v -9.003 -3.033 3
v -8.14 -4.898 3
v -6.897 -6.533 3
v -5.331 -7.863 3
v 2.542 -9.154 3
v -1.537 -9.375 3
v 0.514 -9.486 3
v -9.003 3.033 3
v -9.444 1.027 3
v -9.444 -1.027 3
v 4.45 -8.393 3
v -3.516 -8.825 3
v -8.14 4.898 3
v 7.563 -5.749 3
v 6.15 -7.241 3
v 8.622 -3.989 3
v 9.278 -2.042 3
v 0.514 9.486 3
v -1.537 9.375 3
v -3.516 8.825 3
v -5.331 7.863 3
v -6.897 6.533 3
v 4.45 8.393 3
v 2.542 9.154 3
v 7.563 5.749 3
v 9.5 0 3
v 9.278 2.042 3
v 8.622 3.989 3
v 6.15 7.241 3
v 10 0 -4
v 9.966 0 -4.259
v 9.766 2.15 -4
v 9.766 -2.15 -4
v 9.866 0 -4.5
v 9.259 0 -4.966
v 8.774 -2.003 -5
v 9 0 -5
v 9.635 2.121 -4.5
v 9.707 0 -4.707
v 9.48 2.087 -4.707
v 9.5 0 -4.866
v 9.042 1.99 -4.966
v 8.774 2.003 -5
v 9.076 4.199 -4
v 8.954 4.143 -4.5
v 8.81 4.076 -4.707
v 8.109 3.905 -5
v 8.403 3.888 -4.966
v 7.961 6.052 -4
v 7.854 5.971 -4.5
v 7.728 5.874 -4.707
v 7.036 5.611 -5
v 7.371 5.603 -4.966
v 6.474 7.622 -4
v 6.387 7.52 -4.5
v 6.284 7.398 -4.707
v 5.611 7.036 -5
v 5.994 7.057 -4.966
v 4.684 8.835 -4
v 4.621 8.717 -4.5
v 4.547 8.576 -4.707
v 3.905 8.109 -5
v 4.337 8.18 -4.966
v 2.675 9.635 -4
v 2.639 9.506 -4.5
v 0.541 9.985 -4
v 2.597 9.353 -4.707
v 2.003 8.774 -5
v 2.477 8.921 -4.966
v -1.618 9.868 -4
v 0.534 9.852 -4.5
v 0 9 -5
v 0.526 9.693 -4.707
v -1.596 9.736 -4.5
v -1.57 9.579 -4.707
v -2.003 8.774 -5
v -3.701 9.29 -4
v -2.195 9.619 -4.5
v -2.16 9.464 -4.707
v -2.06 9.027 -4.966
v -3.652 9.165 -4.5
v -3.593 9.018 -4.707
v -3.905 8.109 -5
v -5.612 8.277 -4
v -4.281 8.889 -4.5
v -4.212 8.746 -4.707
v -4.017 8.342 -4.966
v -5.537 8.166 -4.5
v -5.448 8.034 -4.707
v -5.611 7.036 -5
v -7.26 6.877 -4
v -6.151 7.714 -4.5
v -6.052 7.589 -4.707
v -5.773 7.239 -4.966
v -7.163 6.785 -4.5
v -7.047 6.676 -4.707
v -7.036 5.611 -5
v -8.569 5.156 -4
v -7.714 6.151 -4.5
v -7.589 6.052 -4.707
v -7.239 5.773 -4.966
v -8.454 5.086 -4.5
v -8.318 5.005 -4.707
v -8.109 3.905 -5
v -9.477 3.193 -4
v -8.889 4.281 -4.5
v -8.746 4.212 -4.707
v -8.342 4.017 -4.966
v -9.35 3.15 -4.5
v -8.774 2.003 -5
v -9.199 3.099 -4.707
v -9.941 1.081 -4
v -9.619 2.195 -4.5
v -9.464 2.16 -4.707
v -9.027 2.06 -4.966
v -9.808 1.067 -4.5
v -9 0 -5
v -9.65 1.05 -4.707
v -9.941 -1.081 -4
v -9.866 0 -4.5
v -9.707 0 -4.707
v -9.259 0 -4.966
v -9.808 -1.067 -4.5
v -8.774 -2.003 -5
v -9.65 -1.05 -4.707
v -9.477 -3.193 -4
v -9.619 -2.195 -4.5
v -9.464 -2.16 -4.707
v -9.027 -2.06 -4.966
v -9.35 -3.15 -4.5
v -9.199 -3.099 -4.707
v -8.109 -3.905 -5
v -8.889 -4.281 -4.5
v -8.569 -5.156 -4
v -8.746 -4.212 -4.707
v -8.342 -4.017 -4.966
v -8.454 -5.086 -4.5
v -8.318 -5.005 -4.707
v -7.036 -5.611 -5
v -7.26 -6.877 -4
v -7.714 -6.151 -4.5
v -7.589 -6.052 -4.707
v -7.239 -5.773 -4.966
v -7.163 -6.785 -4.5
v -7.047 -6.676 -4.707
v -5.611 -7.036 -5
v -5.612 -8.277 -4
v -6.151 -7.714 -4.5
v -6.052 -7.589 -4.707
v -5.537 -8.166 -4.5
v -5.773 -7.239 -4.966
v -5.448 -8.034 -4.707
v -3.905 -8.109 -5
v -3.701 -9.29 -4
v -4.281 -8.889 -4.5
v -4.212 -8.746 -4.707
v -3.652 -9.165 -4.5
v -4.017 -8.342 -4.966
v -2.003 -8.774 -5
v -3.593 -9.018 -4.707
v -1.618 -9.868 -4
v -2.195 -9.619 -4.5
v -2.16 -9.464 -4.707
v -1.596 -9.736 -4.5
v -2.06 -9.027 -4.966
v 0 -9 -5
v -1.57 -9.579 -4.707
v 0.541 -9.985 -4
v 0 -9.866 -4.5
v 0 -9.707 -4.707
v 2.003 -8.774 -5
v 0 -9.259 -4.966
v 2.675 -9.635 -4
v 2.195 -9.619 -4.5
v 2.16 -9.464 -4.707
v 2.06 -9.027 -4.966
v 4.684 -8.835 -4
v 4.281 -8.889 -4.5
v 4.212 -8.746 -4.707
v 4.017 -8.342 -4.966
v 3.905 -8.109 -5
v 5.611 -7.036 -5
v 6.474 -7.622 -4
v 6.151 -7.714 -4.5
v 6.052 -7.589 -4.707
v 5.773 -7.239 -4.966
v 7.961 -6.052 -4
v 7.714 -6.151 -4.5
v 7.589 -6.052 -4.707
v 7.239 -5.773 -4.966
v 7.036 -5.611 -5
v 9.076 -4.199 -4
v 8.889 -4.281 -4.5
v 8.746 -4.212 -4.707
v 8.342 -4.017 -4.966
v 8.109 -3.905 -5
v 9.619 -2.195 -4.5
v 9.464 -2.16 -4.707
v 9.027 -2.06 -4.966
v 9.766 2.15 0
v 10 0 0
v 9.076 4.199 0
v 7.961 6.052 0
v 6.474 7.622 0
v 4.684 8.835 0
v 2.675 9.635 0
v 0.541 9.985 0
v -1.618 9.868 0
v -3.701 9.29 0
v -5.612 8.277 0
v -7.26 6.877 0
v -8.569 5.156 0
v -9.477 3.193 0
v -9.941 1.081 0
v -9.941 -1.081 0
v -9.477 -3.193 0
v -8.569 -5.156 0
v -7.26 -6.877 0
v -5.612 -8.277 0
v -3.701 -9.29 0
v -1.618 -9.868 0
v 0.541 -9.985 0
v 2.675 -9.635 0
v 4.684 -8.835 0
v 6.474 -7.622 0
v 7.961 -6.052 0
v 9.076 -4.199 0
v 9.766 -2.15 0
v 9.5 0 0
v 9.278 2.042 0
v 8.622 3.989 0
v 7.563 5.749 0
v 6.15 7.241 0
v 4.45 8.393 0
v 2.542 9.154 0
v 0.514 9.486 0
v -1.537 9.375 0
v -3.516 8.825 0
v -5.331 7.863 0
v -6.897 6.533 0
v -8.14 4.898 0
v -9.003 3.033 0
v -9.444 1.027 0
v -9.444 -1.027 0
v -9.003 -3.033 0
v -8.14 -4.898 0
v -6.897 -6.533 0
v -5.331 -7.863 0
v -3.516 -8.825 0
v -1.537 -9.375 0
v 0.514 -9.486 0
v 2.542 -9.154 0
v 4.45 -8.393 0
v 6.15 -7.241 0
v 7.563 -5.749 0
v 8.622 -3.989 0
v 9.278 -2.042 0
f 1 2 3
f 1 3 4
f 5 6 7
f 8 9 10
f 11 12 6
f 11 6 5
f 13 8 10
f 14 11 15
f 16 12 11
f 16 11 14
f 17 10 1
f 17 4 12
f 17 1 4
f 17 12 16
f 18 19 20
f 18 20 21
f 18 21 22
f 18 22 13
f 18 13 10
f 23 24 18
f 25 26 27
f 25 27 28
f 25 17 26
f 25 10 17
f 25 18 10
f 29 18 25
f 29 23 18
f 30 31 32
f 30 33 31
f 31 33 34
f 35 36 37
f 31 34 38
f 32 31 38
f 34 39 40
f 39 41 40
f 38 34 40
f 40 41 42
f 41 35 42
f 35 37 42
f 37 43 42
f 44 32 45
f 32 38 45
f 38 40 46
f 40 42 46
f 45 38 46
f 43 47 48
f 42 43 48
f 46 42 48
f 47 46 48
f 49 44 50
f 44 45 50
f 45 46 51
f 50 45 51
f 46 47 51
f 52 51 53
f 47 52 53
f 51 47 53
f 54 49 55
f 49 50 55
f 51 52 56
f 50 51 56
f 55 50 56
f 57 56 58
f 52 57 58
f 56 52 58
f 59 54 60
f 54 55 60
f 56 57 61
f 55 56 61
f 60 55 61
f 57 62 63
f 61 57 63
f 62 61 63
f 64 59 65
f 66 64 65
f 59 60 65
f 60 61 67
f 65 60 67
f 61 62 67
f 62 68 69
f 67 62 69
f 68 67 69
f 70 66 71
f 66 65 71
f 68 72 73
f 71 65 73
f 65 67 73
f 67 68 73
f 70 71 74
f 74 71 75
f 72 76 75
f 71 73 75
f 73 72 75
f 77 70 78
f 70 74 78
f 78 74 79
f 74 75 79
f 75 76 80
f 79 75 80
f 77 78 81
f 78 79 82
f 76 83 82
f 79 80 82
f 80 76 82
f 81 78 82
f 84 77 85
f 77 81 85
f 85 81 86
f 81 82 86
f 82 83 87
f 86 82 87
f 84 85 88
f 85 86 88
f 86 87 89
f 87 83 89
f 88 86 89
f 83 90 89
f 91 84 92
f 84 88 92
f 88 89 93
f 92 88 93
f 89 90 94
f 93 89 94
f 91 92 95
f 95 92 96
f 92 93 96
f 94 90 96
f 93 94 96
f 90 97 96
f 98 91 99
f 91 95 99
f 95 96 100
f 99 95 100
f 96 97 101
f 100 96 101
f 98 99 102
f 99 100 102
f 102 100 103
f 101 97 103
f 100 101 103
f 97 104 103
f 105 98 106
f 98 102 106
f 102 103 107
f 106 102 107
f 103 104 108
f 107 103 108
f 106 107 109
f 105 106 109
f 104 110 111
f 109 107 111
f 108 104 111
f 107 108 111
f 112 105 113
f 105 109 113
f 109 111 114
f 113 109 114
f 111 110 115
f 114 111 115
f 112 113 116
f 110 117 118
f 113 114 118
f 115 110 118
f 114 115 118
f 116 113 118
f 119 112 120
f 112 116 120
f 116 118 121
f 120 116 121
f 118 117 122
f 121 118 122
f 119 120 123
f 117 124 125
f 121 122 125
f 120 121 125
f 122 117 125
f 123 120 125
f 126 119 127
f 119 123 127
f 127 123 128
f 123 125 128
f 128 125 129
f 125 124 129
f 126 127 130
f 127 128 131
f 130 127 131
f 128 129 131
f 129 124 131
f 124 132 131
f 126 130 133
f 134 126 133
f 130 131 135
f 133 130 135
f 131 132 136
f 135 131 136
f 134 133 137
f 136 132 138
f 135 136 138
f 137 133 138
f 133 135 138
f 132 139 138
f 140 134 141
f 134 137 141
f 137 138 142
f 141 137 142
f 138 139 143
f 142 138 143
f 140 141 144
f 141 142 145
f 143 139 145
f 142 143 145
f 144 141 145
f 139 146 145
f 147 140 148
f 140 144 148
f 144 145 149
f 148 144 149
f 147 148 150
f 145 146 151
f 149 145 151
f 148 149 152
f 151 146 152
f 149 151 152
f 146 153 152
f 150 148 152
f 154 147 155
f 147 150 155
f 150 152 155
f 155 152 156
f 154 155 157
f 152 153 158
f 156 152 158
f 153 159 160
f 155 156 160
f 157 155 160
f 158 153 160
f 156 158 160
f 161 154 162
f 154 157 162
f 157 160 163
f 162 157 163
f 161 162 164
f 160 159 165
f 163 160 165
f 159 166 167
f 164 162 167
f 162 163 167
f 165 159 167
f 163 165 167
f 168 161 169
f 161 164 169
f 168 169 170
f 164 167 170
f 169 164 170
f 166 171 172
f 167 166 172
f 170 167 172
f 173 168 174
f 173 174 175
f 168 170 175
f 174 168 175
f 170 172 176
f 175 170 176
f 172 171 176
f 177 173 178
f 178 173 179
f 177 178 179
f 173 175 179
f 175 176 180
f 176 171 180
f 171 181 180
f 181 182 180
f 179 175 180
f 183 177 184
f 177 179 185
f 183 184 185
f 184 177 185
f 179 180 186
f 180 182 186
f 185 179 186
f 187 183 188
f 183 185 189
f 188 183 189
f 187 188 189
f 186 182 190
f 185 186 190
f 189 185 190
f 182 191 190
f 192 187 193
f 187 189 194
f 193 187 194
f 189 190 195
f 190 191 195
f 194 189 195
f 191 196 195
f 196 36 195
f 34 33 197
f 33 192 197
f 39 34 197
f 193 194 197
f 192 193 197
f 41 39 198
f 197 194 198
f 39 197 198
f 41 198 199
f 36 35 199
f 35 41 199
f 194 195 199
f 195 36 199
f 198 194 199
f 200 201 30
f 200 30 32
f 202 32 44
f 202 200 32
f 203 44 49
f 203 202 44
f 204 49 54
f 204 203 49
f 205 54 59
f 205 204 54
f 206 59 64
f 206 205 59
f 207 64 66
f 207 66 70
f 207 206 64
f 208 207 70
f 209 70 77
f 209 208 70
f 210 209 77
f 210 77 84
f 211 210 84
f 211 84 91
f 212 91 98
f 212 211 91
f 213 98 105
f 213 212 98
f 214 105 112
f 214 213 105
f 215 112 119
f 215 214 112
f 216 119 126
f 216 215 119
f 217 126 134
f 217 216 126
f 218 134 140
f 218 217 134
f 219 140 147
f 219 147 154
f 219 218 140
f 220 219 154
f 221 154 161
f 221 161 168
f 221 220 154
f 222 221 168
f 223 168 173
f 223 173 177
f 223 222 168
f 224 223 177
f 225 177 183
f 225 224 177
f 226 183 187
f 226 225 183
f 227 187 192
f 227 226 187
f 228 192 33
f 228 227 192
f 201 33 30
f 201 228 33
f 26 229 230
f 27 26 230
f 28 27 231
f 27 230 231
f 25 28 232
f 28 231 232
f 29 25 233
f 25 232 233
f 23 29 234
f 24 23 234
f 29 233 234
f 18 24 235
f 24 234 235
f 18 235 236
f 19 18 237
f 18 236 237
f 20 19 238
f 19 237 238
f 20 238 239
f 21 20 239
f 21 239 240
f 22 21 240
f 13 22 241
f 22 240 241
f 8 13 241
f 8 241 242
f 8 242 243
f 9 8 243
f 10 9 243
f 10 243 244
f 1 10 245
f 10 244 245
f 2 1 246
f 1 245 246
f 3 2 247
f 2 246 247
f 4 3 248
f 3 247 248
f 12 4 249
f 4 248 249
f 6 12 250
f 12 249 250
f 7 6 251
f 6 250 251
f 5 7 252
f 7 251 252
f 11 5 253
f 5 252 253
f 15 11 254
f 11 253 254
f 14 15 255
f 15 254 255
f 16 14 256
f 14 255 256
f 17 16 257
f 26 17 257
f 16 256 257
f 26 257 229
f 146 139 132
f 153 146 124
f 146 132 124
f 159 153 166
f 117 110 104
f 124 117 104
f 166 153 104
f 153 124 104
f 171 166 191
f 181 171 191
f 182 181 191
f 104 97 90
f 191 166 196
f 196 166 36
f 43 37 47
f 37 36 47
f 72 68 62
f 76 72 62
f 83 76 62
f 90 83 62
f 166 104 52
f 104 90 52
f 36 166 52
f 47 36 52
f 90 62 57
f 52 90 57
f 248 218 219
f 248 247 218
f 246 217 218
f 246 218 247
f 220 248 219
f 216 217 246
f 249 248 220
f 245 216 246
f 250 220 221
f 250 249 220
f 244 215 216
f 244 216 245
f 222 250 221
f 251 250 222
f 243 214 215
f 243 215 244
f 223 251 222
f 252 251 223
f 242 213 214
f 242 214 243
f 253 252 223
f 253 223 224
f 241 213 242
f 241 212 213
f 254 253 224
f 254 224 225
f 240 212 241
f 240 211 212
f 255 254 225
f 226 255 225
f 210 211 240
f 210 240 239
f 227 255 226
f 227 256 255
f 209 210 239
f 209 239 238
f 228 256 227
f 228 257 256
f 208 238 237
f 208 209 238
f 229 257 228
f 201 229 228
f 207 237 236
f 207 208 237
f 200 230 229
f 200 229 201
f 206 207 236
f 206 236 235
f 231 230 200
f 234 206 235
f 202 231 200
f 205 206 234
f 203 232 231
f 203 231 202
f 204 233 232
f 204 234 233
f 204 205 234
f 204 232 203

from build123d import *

# Parameters (mm, degrees)
F0_R     = 9.5
F1_DEPTH = 3
F0_R_2   = 10
F2_DEPTH = 5
F3_R     = 1


with BuildPart() as f1:
    # F0 (on Top) → F1 (new body)
    with BuildSketch(Plane.XY):
        Circle(F0_R)
    extrude(amount=F1_DEPTH)

    # F0 (on Top) → F2 (join)
    with BuildSketch(Plane.XY):
        Circle(F0_R_2)
        Circle(F0_R, mode=Mode.SUBTRACT)
        Circle(F0_R)
    extrude(amount=-F2_DEPTH)

    # F3
    f3_edges = [f1.edges().sort_by_distance(p)[0] for p in [
        (-10, 0, -5),
    ]]
    fillet(f3_edges, radius=F3_R)


solid = f1.part
